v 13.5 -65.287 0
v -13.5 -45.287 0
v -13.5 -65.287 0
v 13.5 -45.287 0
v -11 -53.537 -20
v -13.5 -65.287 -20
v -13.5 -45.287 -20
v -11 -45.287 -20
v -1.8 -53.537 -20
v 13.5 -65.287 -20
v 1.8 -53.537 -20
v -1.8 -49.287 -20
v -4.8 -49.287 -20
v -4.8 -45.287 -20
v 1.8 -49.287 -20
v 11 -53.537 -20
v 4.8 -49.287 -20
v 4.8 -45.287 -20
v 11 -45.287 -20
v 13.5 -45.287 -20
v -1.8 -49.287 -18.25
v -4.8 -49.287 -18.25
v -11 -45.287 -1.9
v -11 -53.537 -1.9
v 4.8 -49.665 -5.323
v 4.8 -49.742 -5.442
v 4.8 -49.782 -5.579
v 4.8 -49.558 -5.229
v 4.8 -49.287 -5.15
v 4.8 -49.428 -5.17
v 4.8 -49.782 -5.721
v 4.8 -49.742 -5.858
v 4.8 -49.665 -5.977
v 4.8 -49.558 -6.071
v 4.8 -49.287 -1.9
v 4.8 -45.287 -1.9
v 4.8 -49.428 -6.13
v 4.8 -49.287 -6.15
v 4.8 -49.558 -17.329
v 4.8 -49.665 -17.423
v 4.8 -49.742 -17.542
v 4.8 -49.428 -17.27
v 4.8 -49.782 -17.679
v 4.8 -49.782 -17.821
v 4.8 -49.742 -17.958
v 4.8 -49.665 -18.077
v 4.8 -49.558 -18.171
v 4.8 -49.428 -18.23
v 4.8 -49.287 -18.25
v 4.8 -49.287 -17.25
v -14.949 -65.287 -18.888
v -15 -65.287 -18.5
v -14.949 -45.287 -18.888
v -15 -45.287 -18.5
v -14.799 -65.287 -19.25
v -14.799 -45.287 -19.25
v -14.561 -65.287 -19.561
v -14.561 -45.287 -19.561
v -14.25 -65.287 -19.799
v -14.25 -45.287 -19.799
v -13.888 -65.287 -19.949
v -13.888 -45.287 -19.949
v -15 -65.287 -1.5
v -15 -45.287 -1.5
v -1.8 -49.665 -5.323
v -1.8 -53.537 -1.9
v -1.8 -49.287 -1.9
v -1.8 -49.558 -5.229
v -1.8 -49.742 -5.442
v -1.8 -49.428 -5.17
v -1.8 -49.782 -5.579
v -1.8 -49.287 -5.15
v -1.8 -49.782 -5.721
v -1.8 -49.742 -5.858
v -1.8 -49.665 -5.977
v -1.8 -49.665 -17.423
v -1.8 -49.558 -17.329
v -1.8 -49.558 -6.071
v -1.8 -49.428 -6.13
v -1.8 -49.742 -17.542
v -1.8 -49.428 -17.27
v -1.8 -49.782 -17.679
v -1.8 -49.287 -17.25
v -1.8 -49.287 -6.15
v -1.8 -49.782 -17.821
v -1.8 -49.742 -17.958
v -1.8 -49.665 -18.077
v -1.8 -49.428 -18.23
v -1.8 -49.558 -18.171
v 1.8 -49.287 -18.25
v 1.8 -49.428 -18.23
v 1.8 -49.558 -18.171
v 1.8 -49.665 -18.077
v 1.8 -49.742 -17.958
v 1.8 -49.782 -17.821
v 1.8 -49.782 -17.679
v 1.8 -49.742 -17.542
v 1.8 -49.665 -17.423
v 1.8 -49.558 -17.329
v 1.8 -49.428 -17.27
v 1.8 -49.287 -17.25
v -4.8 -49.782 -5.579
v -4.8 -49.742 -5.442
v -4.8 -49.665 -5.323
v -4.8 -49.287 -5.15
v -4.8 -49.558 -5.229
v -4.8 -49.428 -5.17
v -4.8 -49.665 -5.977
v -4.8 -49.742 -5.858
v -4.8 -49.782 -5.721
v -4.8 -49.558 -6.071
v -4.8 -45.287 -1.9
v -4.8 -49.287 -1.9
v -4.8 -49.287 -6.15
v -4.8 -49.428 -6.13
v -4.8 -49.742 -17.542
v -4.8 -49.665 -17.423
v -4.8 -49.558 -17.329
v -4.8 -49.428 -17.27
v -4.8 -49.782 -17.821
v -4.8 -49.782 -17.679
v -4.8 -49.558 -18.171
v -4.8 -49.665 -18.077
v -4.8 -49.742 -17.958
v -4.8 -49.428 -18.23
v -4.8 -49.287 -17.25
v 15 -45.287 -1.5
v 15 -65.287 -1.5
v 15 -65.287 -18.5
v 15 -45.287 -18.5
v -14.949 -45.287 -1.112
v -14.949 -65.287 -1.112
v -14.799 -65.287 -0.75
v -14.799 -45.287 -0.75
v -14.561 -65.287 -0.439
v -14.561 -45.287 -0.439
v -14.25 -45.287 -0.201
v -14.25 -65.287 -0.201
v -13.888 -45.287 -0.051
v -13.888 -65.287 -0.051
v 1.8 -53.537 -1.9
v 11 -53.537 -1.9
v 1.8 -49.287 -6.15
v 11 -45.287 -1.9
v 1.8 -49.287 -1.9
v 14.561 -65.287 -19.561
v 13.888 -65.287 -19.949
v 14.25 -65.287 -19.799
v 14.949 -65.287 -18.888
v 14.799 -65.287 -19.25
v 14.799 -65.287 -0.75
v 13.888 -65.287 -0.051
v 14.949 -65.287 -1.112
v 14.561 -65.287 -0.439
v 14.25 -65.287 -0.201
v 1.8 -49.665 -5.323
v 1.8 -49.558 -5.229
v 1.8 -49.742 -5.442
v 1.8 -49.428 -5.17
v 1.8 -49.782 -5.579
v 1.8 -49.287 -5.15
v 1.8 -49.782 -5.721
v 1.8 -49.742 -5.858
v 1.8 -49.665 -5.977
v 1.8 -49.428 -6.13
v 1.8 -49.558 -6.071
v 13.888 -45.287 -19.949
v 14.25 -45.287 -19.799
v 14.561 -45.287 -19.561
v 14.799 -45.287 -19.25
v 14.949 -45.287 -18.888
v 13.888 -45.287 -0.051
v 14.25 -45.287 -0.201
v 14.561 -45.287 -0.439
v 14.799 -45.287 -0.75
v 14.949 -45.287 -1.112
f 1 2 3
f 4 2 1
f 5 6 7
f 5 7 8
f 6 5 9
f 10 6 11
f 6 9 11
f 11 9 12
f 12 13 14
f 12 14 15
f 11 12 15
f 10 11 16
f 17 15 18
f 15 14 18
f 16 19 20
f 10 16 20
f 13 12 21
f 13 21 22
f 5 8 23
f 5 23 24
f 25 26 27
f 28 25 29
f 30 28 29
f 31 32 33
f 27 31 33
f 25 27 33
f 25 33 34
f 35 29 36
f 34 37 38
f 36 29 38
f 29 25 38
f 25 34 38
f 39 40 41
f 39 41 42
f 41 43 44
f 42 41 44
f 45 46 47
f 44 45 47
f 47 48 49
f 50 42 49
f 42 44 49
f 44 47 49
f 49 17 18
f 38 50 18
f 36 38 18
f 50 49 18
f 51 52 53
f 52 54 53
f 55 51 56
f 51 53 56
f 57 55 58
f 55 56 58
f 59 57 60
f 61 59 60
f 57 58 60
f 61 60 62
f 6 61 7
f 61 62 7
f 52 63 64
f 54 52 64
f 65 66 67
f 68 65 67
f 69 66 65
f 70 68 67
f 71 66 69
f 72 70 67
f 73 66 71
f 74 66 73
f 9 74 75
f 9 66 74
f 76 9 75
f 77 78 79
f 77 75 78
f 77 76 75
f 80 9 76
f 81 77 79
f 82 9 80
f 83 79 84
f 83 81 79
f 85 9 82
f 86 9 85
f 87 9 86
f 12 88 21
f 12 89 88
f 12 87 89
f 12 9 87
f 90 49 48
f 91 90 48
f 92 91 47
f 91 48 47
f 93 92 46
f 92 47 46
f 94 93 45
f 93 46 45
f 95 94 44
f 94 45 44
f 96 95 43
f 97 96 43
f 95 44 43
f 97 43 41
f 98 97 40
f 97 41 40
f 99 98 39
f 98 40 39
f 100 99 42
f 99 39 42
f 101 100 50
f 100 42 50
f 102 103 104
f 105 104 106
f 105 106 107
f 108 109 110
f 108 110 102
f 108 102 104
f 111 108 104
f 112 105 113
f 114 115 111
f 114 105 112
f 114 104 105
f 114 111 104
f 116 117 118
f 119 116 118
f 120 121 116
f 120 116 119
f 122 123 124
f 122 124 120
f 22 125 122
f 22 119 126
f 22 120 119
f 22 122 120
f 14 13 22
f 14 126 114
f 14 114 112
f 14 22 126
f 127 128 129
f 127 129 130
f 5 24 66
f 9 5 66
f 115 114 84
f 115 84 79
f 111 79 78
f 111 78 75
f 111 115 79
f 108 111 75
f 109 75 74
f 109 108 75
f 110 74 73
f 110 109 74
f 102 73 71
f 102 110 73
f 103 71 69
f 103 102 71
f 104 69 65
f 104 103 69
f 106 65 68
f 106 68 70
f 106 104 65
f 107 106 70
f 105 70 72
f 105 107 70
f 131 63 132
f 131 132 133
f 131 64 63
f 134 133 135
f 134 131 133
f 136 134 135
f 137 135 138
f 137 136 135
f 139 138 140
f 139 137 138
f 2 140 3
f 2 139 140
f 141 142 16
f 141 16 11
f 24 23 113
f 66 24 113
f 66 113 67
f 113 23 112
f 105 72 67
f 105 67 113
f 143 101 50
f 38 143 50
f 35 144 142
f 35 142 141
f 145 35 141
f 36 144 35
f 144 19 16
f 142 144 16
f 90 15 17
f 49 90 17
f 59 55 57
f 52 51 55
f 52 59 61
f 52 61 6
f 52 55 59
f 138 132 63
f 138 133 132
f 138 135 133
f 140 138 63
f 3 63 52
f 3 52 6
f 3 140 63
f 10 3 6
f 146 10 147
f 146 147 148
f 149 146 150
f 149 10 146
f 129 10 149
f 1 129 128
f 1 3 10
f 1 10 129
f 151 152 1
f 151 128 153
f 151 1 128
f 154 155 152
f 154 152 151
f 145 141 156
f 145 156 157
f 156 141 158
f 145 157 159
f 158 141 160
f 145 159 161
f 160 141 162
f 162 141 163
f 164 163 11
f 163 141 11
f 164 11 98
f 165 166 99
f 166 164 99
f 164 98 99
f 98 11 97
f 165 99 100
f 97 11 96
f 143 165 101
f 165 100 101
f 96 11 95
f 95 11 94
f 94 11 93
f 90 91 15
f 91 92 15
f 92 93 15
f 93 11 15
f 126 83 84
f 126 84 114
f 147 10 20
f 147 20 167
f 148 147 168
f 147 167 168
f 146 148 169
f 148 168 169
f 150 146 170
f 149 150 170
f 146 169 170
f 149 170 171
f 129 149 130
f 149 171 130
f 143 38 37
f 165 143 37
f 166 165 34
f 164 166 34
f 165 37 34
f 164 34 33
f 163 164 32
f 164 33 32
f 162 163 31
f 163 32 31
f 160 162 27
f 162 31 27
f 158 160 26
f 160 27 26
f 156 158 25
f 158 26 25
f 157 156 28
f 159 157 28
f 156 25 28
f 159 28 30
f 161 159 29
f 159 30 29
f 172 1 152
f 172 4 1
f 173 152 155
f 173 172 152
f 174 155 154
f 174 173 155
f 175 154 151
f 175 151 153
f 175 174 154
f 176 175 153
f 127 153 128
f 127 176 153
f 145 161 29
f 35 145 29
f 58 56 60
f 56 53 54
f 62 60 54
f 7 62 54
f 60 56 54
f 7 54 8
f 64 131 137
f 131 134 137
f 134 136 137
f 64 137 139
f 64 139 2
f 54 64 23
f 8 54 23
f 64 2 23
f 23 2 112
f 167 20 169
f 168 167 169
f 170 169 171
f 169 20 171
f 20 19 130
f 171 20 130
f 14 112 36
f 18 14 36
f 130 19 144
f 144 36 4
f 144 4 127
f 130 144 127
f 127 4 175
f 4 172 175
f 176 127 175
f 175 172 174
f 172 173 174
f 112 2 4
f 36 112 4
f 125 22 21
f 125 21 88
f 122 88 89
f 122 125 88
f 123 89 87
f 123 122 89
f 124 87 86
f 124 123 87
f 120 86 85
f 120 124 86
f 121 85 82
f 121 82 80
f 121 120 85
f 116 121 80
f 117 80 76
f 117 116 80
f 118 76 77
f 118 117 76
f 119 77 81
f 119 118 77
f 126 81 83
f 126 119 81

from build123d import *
from OCP.BRepFilletAPI import BRepFilletAPI_MakeChamfer

# Parameters (mm, degrees)
BOSS_EXTRUDE1_DEPTH           = 10
BOSS_EXTRUDE1_DEPTH_BACK      = 20
SKETCH12_R                    = 15
CUT_EXTRUDE9_DEPTH            = 8
CHAMFER1_SIZE                 = 1.5
CHAMFER1_SIZE2                = 0.46241
FILLET11_R                    = 0.78
CHAMFER2_SIZE2                = 5
CHAMFER2_SIZE                 = 8
CUT_EXTRUDE10_START           = -3
SKETCH18_W                    = 25.5
SKETCH18_H                    = 24.1
CUT_EXTRUDE10_DEPTH           = 4.1
SKETCH19_W                    = 8.6
SKETCH19_H                    = 8.6
CUT_EXTRUDE13_DEPTH           = 3.7
CUT_EXTRUDE14_DEPTH           = 2
SKETCH21_R                    = 3.8
CUT_EXTRUDE15_DEPTH           = 116.348128402
SKETCH10_R                    = 12.5
CUT_EXTRUDE8_DEPTH            = 3
SKETCH22_R                    = 0.95
BOSS_EXTRUDE5_DEPTH           = 1.1
BOSS_EXTRUDE5_DRAFT           = 30
BOSS_EXTRUDE5_PROFILE_2_DEPTH = 1.1
BOSS_EXTRUDE5_PROFILE_2_DRAFT = 30
BOSS_EXTRUDE5_PROFILE_3_DEPTH = 1.1
BOSS_EXTRUDE5_PROFILE_3_DRAFT = 30
BOSS_EXTRUDE5_PROFILE_4_DEPTH = 1.1
BOSS_EXTRUDE5_PROFILE_4_DRAFT = 30
CUT_EXTRUDE16_DEPTH           = 8.5
FILLET13_R                    = 2
BOSS_EXTRUDE6_DEPTH           = 3
LPATTERN1_COUNT               = 2
LPATTERN1_PITCH               = 150
LPATTERN1_COPY_1_SKETCH_R     = 0.95
LPATTERN1_COPY_1_DEPTH        = 1.1
LPATTERN1_COPY_1_DRAFT        = 30
LPATTERN1_COPY_2_SKETCH_R     = 0.95
LPATTERN1_COPY_2_DEPTH        = 1.1
LPATTERN1_COPY_2_DRAFT        = 30
LPATTERN1_COPY_3_SKETCH_R     = 0.95
LPATTERN1_COPY_3_DEPTH        = 1.1
LPATTERN1_COPY_3_DRAFT        = 30
LPATTERN1_COPY_4_SKETCH_R     = 0.95
LPATTERN1_COPY_4_DEPTH        = 1.1
LPATTERN1_COPY_4_DRAFT        = 30
LPATTERN1_COPY_5_SKETCH_R     = 0.95
LPATTERN1_COPY_5_DEPTH        = 1.1
LPATTERN1_COPY_5_DRAFT        = 30
LPATTERN1_COPY_6_SKETCH_R     = 0.95
LPATTERN1_COPY_6_DEPTH        = 1.1
LPATTERN1_COPY_6_DRAFT        = 30
LPATTERN1_COPY_7_SKETCH_R     = 0.95
LPATTERN1_COPY_7_DEPTH        = 1.1
LPATTERN1_COPY_7_DRAFT        = 30
FILLET13_OF_LPATTERN1_R       = 2
FILLET12_R                    = 100
FILLET14_R                    = 1
SKETCH32_R                    = 4.55
SKETCH32_R_2                  = 4.5
CUT_EXTRUDE17_DEPTH           = 3
SKETCH33_R                    = 2.75
CUT_EXTRUDE18_DEPTH           = 114.802213105
CUT_EXTRUDE19_DEPTH           = 5
SKETCH56_W                    = 30
SKETCH56_H                    = 20
BOSS_EXTRUDE10_DEPTH          = 20
CUT_EXTRUDE21_DEPTH           = 18.1
FILLET15_R                    = 1.5


# Read off the part's stored shape, not the designer's step: Split3
# Some blends are built 0.0001 mm under size
with BuildPart() as part:
    # Sketch1 → Boss-Extrude1 (new, two sides: drawn at the far end of the back side and taken through both)
    with BuildSketch(Plane.XY.offset(-BOSS_EXTRUDE1_DEPTH_BACK)):
        with BuildLine():
            Line((-100, -15), (0, -51.866662613))
            Line((0, -51.866662613), (100, -15))
            Line((100, -15), (100, 15))
            Line((100, 15), (60, 15))
            add(Edge.make_bspline(
                [(-60, 15), (-39.699350007, 14.814430853), (0, 45.185569147), (39.699350007, 14.814430853), (60, 15)],
                knots=[0, 0, 0, 0, 0.5, 1, 1, 1, 1], degree=3))
            Line((-60, 15), (-100, 15))
            Line((-100, 15), (-100, -15))
        make_face()
        with BuildLine():
            Line((3.188323159, 2.335673435), (2.875864874, 2.765735369))
            Line((2.875864874, 2.765735369), (4.089390366, 3.647413248))
            Line((4.089390366, 3.647413248), (4.40184865, 3.217351313))
            ThreePointArc((4.40184865, 3.217351313), (5.258610463, 4.17939586), (5.908815238, 5.29151288))
            Line((5.908815238, 5.29151288), (5.403247113, 5.455781921))
            Line((5.403247113, 5.455781921), (5.866772605, 6.882366696))
            Line((5.866772605, 6.882366696), (6.37234073, 6.718097654))
            ThreePointArc((6.37234073, 6.718097654), (6.5, 8), (6.37234073, 9.281902346))
            Line((6.37234073, 9.281902346), (5.866772605, 9.117633304))
            Line((5.866772605, 9.117633304), (5.403247113, 10.544218079))
            Line((5.403247113, 10.544218079), (5.908815238, 10.70848712))
            ThreePointArc((5.908815238, 10.70848712), (5.258610463, 11.82060414), (4.40184865, 12.782648687))
            Line((4.40184865, 12.782648687), (4.089390366, 12.352586752))
            Line((4.089390366, 12.352586752), (2.875864874, 13.234264631))
            Line((2.875864874, 13.234264631), (3.188323159, 13.664326565))
            ThreePointArc((3.188323159, 13.664326565), (2.008610463, 14.181867356), (0.75, 14.456585785))
            Line((0.75, 14.456585785), (0.75, 13.925))
            Line((0.75, 13.925), (-0.75, 13.925))
            Line((-0.75, 13.925), (-0.75, 14.456585785))
            ThreePointArc((-0.75, 14.456585785), (-2.008610463, 14.181867356), (-3.188323159, 13.664326565))
            Line((-3.188323159, 13.664326565), (-2.875864874, 13.234264631))
            Line((-2.875864874, 13.234264631), (-4.089390366, 12.352586752))
            Line((-4.089390366, 12.352586752), (-4.40184865, 12.782648687))
            ThreePointArc((-4.40184865, 12.782648687), (-5.258610463, 11.82060414), (-5.908815238, 10.70848712))
            Line((-5.908815238, 10.70848712), (-5.403247113, 10.544218079))
            Line((-5.403247113, 10.544218079), (-5.866772605, 9.117633304))
            Line((-5.866772605, 9.117633304), (-6.37234073, 9.281902346))
            ThreePointArc((-6.37234073, 9.281902346), (-6.5, 8), (-6.37234073, 6.718097654))
            Line((-6.37234073, 6.718097654), (-5.866772605, 6.882366696))
            Line((-5.866772605, 6.882366696), (-5.403247113, 5.455781921))
            Line((-5.403247113, 5.455781921), (-5.908815238, 5.29151288))
            ThreePointArc((-5.908815238, 5.29151288), (-5.258610463, 4.17939586), (-4.40184865, 3.217351313))
            Line((-4.40184865, 3.217351313), (-4.089390366, 3.647413248))
            Line((-4.089390366, 3.647413248), (-2.875864874, 2.765735369))
            Line((-2.875864874, 2.765735369), (-3.188323159, 2.335673435))
            ThreePointArc((-3.188323159, 2.335673435), (-2.008610463, 1.818132644), (-0.75, 1.543414215))
            Line((-0.75, 1.543414215), (-0.75, 2.075))
            Line((-0.75, 2.075), (0.75, 2.075))
            Line((0.75, 2.075), (0.75, 1.543414215))
            ThreePointArc((0.75, 1.543414215), (2.008610463, 1.818132644), (3.188323159, 2.335673435))
        make_face(mode=Mode.SUBTRACT)
    extrude(amount=BOSS_EXTRUDE1_DEPTH + BOSS_EXTRUDE1_DEPTH_BACK)

    # Sketch12 → Cut-Extrude9 (cut)
    with BuildSketch(Plane(origin=(0, 0, -20), x_dir=(-1, 0, 0), z_dir=(0, 0, -1))):
        with Locations((0, 8)):
            Circle(SKETCH12_R)
    extrude(amount=-CUT_EXTRUDE9_DEPTH, mode=Mode.SUBTRACT)

    # Chamfer1: one chamfer whose edges measure the first distance from different faces: ONE call of the kernel's chamfer builder (chamfer() names one face for all edges)
    chamfer1_edges_1 = [part.edges().sort_by_distance(p)[0] for p in [
        (0, 2.075, -12),
    ]]
    chamfer1_side_1 = [part.faces().sort_by_distance(p)[0] for p in [
        (0, 2.075, -1),
    ]]
    chamfer1_edges_2 = [part.edges().sort_by_distance(p)[0] for p in [
        (3.48262762, 3.206574308, -12),
    ]]
    chamfer1_side_2 = [part.faces().sort_by_distance(p)[0] for p in [
        (3.48262762, 3.206574308, -1),
    ]]
    chamfer1_edges_3 = [part.edges().sort_by_distance(p)[0] for p in [
        (5.635009859, 6.169074308, -12),
    ]]
    chamfer1_side_3 = [part.faces().sort_by_distance(p)[0] for p in [
        (5.635009859, 6.169074308, -1),
    ]]
    chamfer1_edges_4 = [part.edges().sort_by_distance(p)[0] for p in [
        (5.635009859, 9.830925692, -12),
    ]]
    chamfer1_side_4 = [part.faces().sort_by_distance(p)[0] for p in [
        (5.635009859, 9.830925692, -1),
    ]]
    chamfer1_edges_5 = [part.edges().sort_by_distance(p)[0] for p in [
        (3.48262762, 12.793425692, -12),
    ]]
    chamfer1_side_5 = [part.faces().sort_by_distance(p)[0] for p in [
        (3.48262762, 12.793425692, -1),
    ]]
    chamfer1_edges_6 = [part.edges().sort_by_distance(p)[0] for p in [
        (0, 13.925, -12),
    ]]
    chamfer1_side_6 = [part.faces().sort_by_distance(p)[0] for p in [
        (0, 13.925, -1),
    ]]
    chamfer1_edges_7 = [part.edges().sort_by_distance(p)[0] for p in [
        (-3.48262762, 12.793425692, -12),
    ]]
    chamfer1_side_7 = [part.faces().sort_by_distance(p)[0] for p in [
        (-3.48262762, 12.793425692, -1),
    ]]
    chamfer1_edges_8 = [part.edges().sort_by_distance(p)[0] for p in [
        (-5.635009859, 9.830925692, -12),
    ]]
    chamfer1_side_8 = [part.faces().sort_by_distance(p)[0] for p in [
        (-5.635009859, 9.830925692, -1),
    ]]
    chamfer1_edges_9 = [part.edges().sort_by_distance(p)[0] for p in [
        (-5.635009859, 6.169074308, -12),
    ]]
    chamfer1_side_9 = [part.faces().sort_by_distance(p)[0] for p in [
        (-5.635009859, 6.169074308, -1),
    ]]
    chamfer1_edges_10 = [part.edges().sort_by_distance(p)[0] for p in [
        (-3.48262762, 3.206574308, -12),
    ]]
    chamfer1_side_10 = [part.faces().sort_by_distance(p)[0] for p in [
        (-3.48262762, 3.206574308, -1),
    ]]
    chamfer1 = BRepFilletAPI_MakeChamfer(part.part.solid().wrapped)
    for e in chamfer1_edges_1:
        chamfer1.Add(CHAMFER1_SIZE, CHAMFER1_SIZE2, e.wrapped, chamfer1_side_1[0].wrapped)  # the first distance lies on this face
    for e in chamfer1_edges_2:
        chamfer1.Add(CHAMFER1_SIZE, CHAMFER1_SIZE2, e.wrapped, chamfer1_side_2[0].wrapped)  # the first distance lies on this face
    for e in chamfer1_edges_3:
        chamfer1.Add(CHAMFER1_SIZE, CHAMFER1_SIZE2, e.wrapped, chamfer1_side_3[0].wrapped)  # the first distance lies on this face
    for e in chamfer1_edges_4:
        chamfer1.Add(CHAMFER1_SIZE, CHAMFER1_SIZE2, e.wrapped, chamfer1_side_4[0].wrapped)  # the first distance lies on this face
    for e in chamfer1_edges_5:
        chamfer1.Add(CHAMFER1_SIZE, CHAMFER1_SIZE2, e.wrapped, chamfer1_side_5[0].wrapped)  # the first distance lies on this face
    for e in chamfer1_edges_6:
        chamfer1.Add(CHAMFER1_SIZE, CHAMFER1_SIZE2, e.wrapped, chamfer1_side_6[0].wrapped)  # the first distance lies on this face
    for e in chamfer1_edges_7:
        chamfer1.Add(CHAMFER1_SIZE, CHAMFER1_SIZE2, e.wrapped, chamfer1_side_7[0].wrapped)  # the first distance lies on this face
    for e in chamfer1_edges_8:
        chamfer1.Add(CHAMFER1_SIZE, CHAMFER1_SIZE2, e.wrapped, chamfer1_side_8[0].wrapped)  # the first distance lies on this face
    for e in chamfer1_edges_9:
        chamfer1.Add(CHAMFER1_SIZE, CHAMFER1_SIZE2, e.wrapped, chamfer1_side_9[0].wrapped)  # the first distance lies on this face
    for e in chamfer1_edges_10:
        chamfer1.Add(CHAMFER1_SIZE, CHAMFER1_SIZE2, e.wrapped, chamfer1_side_10[0].wrapped)  # the first distance lies on this face
    add(Compound.cast(chamfer1.Shape()), mode=Mode.REPLACE)

    # Fillet11
    # the kernel refuses this fillet: 0.78 mm, written as the material it takes off along each edge
    with BuildSketch(Plane(origin=(-4.089390366, 12.352586752, -12.348462837), x_dir=(-0.5877852522924715, 0.8090169943749486, 0), z_dir=(0, 0, 1)), Plane(origin=(-5.866772605, 9.117633304, -12.348462837), x_dir=(-0.9510565162951549, 0.3090169943749433, 0), z_dir=(0, 0, 1)), Plane(origin=(-0.75, 13.925, -12.348462837), x_dir=(0, 1, 0), z_dir=(0, 0, 1)), Plane(origin=(2.875864874, 13.234264631, -12.348462837), x_dir=(0.5877852522924727, 0.8090169943749479, 0), z_dir=(0, 0, 1)), Plane(origin=(5.403247113, 10.544218079, -12.348462837), x_dir=(0.9510565162951538, 0.30901699437494734, 0), z_dir=(0, 0, 1)), Plane(origin=(5.866772605, 6.882366696, -12.348462837), x_dir=(0.9510565162951544, -0.30901699437494534, 0), z_dir=(0, 0, 1)), Plane(origin=(-5.403247113, 5.455781921, -12.348462837), x_dir=(-0.9510565162951544, -0.30901699437494484, 0), z_dir=(0, 0, 1)), Plane(origin=(-2.875864874, 2.765735369, -12.348462837), x_dir=(-0.5877852522924728, -0.8090169943749477, 0), z_dir=(0, 0, 1)), Plane(origin=(0.75, 2.075, -12.348462837), x_dir=(0, -1, 0), z_dir=(0, 0, 1)), Plane(origin=(4.089390366, 3.647413248, -12.348462837), x_dir=(0.5877852522924725, -0.8090169943749479, 0), z_dir=(0, 0, 1))) as fillet11_piece_1:
        with BuildLine():
            CenterArc((0.78, -0.739385135), FILLET11_R, 108.571012268, 71.428987732)
            Line((0, -0.739385135), (-0.0156, -0.739385135))
            Line((-0.0156, -0.739385135), (-0.0156, 0))
            Line((-0.0156, 0), (0, 0.0156))
            ThreePointArc((0, 0.0156), (0.265792893, 0.0156), (0.526617501, 0.014787703))
            Line((0.526617501, 0.014787703), (0.531585785, 0))
        make_face()
    extrude(amount=24.196925675, mode=Mode.SUBTRACT)
    with BuildSketch(Plane(origin=(-5.403247113, 10.544218079, -12.348462837), x_dir=(-0.3090169943749473, -0.9510565162951535, 0), z_dir=(0, 0, 1)), Plane(origin=(-2.875864874, 13.234264631, -12.348462837), x_dir=(-0.809016994374947, -0.5877852522924738, 0), z_dir=(0, 0, 1)), Plane(origin=(0.75, 13.925, -12.348462837), x_dir=(-1, 0, 0), z_dir=(0, 0, 1)), Plane(origin=(4.089390366, 12.352586752, -12.348462837), x_dir=(-0.8090169943749471, 0.5877852522924735, 0), z_dir=(0, 0, 1)), Plane(origin=(5.866772605, 9.117633304, -12.348462837), x_dir=(-0.30901699437494623, 0.951056516295154, 0), z_dir=(0, 0, 1)), Plane(origin=(5.403247113, 5.455781921, -12.348462837), x_dir=(0.30901699437494773, 0.9510565162951536, 0), z_dir=(0, 0, 1)), Plane(origin=(-5.866772605, 6.882366696, -12.348462837), x_dir=(0.3090169943749473, -0.9510565162951536, 0), z_dir=(0, 0, 1)), Plane(origin=(-4.089390366, 3.647413248, -12.348462837), x_dir=(0.809016994374947, -0.5877852522924737, 0), z_dir=(0, 0, 1)), Plane(origin=(-0.75, 2.075, -12.348462837), x_dir=(1, 0, 0), z_dir=(0, 0, 1)), Plane(origin=(2.875864874, 2.765735369, -12.348462837), x_dir=(0.8090169943749471, 0.5877852522924735, 0), z_dir=(0, 0, 1))) as fillet11_piece_2:
        with BuildLine():
            CenterArc((0.739385135, -0.78), FILLET11_R, 90, 71.428987732)
            Line((0, -0.531585785), (-0.014787703, -0.526617501))
            ThreePointArc((-0.014787703, -0.526617501), (-0.0156, -0.265792893), (-0.0156, 0))
            Line((-0.0156, 0), (0, 0.0156))
            Line((0, 0.0156), (0.739385135, 0.0156))
            Line((0.739385135, 0.0156), (0.739385135, 0))
        make_face()
    extrude(amount=24.196925675, mode=Mode.SUBTRACT)

    # Chamfer2
    chamfer2_edges = [part.edges().sort_by_distance(p)[0] for p in [
        (15, 8, -20),
    ]]
    chamfer2_side = [part.faces().sort_by_distance(p)[0] for p in [
        (15, 8, -19.9),
    ]]
    chamfer(chamfer2_edges, length=CHAMFER2_SIZE - 0.0001, length2=CHAMFER2_SIZE2 - 0.0001, reference=chamfer2_side[0])  # a hair under: the kernel refuses the full size

    # Sketch18 → Cut-Extrude10 (cut)
    with BuildSketch(Plane.XY.offset(CUT_EXTRUDE10_START)):
        with Locations((-75, 0.285)):
            Rectangle(SKETCH18_W, SKETCH18_H)
    cut_extrude10 = extrude(amount=CUT_EXTRUDE10_DEPTH, mode=Mode.SUBTRACT)

    # Sketch19 → Cut-Extrude13 (cut)
    with BuildSketch(Plane(origin=(0, 0, 1.1), x_dir=(-1, 0, 0), z_dir=(0, 0, -1))):
        with Locations((75, -2.265)):
            Rectangle(SKETCH19_W, SKETCH19_H)
    cut_extrude13 = extrude(amount=-CUT_EXTRUDE13_DEPTH, mode=Mode.SUBTRACT)

    # Sketch20 → Cut-Extrude14 (cut)
    with BuildSketch(Plane(origin=(0, 0, 1.1), x_dir=(-1, 0, 0), z_dir=(0, 0, -1))):
        Polygon((79.3, 2.035), (79.3, 5.335), (81.5, 5.335), (81.5, 9.835), (70.7, 9.835), (70.7, 2.035), align=None)
    cut_extrude14 = extrude(amount=-CUT_EXTRUDE14_DEPTH, mode=Mode.SUBTRACT)

    # Sketch21 → Cut-Extrude15 (cut, through all)
    with BuildSketch(Plane(origin=(0, 0, 4.8), x_dir=(-1, 0, 0), z_dir=(0, 0, -1))):
        with Locations((75, -2.265)):
            Circle(SKETCH21_R)
    cut_extrude15 = extrude(amount=-CUT_EXTRUDE15_DEPTH, mode=Mode.SUBTRACT)

    # Sketch10 → Cut-Extrude8 (cut)
    with BuildSketch(Plane.XY.offset(10)):
        with Locations((-75, -2.265)):
            Circle(SKETCH10_R)
    cut_extrude8 = extrude(amount=-CUT_EXTRUDE8_DEPTH, mode=Mode.SUBTRACT)


with BuildPart() as boss_extrude5_tool:
    # Sketch22 → Boss-Extrude5 (with draft: the straight prism first)
    with BuildSketch(Plane(origin=(0, 0, 1.1), x_dir=(-1, 0, 0), z_dir=(0, 0, -1))):
        with Locations((64.35, 10.235)):
            Circle(SKETCH22_R)
    extrude(amount=BOSS_EXTRUDE5_DEPTH)
    # Boss-Extrude5: the draft: its side faces are tilted about the plane it starts from
    boss_extrude5_sides = [boss_extrude5_tool.faces().sort_by_distance(p)[0] for p in [
        (-63.4, 10.235, 0.55),
    ]]
    draft(boss_extrude5_sides, Plane(origin=(0, 0, 1.1), x_dir=(-1, 0, 0), z_dir=(0, 0, -1)), BOSS_EXTRUDE5_DRAFT)


with BuildPart() as part_1:
    add(part.part)

    # Boss-Extrude5: add boss_extrude5_tool
    add(boss_extrude5_tool.part)


with BuildPart() as boss_extrude5_profile_2_tool:
    # Sketch22 → Boss-Extrude5 profile 2 (with draft: the straight prism first)
    with BuildSketch(Plane(origin=(0, 0, 1.1), x_dir=(-1, 0, 0), z_dir=(0, 0, -1))):
        with Locations((85.65, 10.235)):
            Circle(SKETCH22_R)
    extrude(amount=BOSS_EXTRUDE5_PROFILE_2_DEPTH)
    # Boss-Extrude5 profile 2: the draft: its side faces are tilted about the plane it starts from
    boss_extrude5_profile_2_sides = [boss_extrude5_profile_2_tool.faces().sort_by_distance(p)[0] for p in [
        (-84.7, 10.235, 0.55),
    ]]
    draft(boss_extrude5_profile_2_sides, Plane(origin=(0, 0, 1.1), x_dir=(-1, 0, 0), z_dir=(0, 0, -1)), BOSS_EXTRUDE5_PROFILE_2_DRAFT)


with BuildPart() as part_2:
    add(part_1.part)

    # Boss-Extrude5 profile 2: add boss_extrude5_profile_2_tool
    add(boss_extrude5_profile_2_tool.part)


with BuildPart() as boss_extrude5_profile_3_tool:
    # Sketch22 → Boss-Extrude5 profile 3 (with draft: the straight prism first)
    with BuildSketch(Plane(origin=(0, 0, 1.1), x_dir=(-1, 0, 0), z_dir=(0, 0, -1))):
        with Locations((85.65, -2.105)):
            Circle(SKETCH22_R)
    extrude(amount=BOSS_EXTRUDE5_PROFILE_3_DEPTH)
    # Boss-Extrude5 profile 3: the draft: its side faces are tilted about the plane it starts from
    boss_extrude5_profile_3_sides = [boss_extrude5_profile_3_tool.faces().sort_by_distance(p)[0] for p in [
        (-84.7, -2.105, 0.55),
    ]]
    draft(boss_extrude5_profile_3_sides, Plane(origin=(0, 0, 1.1), x_dir=(-1, 0, 0), z_dir=(0, 0, -1)), BOSS_EXTRUDE5_PROFILE_3_DRAFT)


with BuildPart() as part_3:
    add(part_2.part)

    # Boss-Extrude5 profile 3: add boss_extrude5_profile_3_tool
    add(boss_extrude5_profile_3_tool.part)


with BuildPart() as boss_extrude5_profile_4_tool:
    # Sketch22 → Boss-Extrude5 profile 4 (with draft: the straight prism first)
    with BuildSketch(Plane(origin=(0, 0, 1.1), x_dir=(-1, 0, 0), z_dir=(0, 0, -1))):
        with Locations((64.35, -2.105)):
            Circle(SKETCH22_R)
    extrude(amount=BOSS_EXTRUDE5_PROFILE_4_DEPTH)
    # Boss-Extrude5 profile 4: the draft: its side faces are tilted about the plane it starts from
    boss_extrude5_profile_4_sides = [boss_extrude5_profile_4_tool.faces().sort_by_distance(p)[0] for p in [
        (-63.4, -2.105, 0.55),
    ]]
    draft(boss_extrude5_profile_4_sides, Plane(origin=(0, 0, 1.1), x_dir=(-1, 0, 0), z_dir=(0, 0, -1)), BOSS_EXTRUDE5_PROFILE_4_DRAFT)


with BuildPart() as part_4:
    add(part_3.part)

    # Boss-Extrude5 profile 4: add boss_extrude5_profile_4_tool
    add(boss_extrude5_profile_4_tool.part)

    # Sketch24 → Cut-Extrude16 (cut, symmetric)
    with BuildSketch(Plane(origin=(-75, 0, 0), x_dir=(0, 0, -1), z_dir=(1, 0, 0))):
        Polygon((0.8, -11.765), (0.8, -19.265), (20, -19.265), (20, -18.065), (2, -18.065), (2, -11.765), align=None)
    cut_extrude16 = extrude(amount=CUT_EXTRUDE16_DEPTH, both=True, mode=Mode.SUBTRACT)

    # Fillet13
    fillet13_edges = [part_4.edges().sort_by_distance(p)[0] for p in [
        (-75, -19.265, -0.8),
        (-75, -18.065, -2),
    ]]
    fillet(fillet13_edges, radius=FILLET13_R)

    # Sketch25 → Boss-Extrude6 (add)
    with BuildSketch(Plane.XY.offset(-3)):
        with BuildLine():
            Line((-84.672341587, 10.739166667), (-83.303552478, 10.739166667))
            ThreePointArc((-83.303552478, 10.739166667), (-83.952943725, 8.537943725), (-86.154166667, 7.888552478))
            Line((-86.154166667, 7.888552478), (-86.154166667, 9.257341587))
            ThreePointArc((-86.154166667, 9.257341587), (-84.872182541, 9.457182541), (-84.672341587, 10.739166667))
        make_face()
        with BuildLine():
            Line((-65.327658413, 10.739166667), (-66.696447522, 10.739166667))
            ThreePointArc((-66.696447522, 10.739166667), (-66.047056275, 8.537943725), (-63.845833333, 7.888552478))
            Line((-63.845833333, 7.888552478), (-63.845833333, 9.257341587))
            ThreePointArc((-63.845833333, 9.257341587), (-65.127817459, 9.457182541), (-65.327658413, 10.739166667))
        make_face()
        with BuildLine():
            Line((-85.65, -1.005), (-85.65, 0.295))
            ThreePointArc((-85.65, 0.295), (-83.25, -2.105), (-85.65, -4.505))
            Line((-85.65, -4.505), (-85.65, -3.205))
            ThreePointArc((-85.65, -3.205), (-84.55, -2.105), (-85.65, -1.005))
        make_face()
        with BuildLine():
            Line((-64.35, -3.205), (-64.35, -4.505))
            ThreePointArc((-64.35, -4.505), (-66.75, -2.105), (-64.35, 0.295))
            Line((-64.35, 0.295), (-64.35, -1.005))
            ThreePointArc((-64.35, -1.005), (-65.45, -2.105), (-64.35, -3.205))
        make_face()
    boss_extrude6 = extrude(amount=BOSS_EXTRUDE6_DEPTH)

    # LPattern1: Cut-Extrude10, Cut-Extrude13, Cut-Extrude14, Cut-Extrude15, Cut-Extrude8, Cut-Extrude16, Boss-Extrude6 ×2
    with Locations(*[(i * LPATTERN1_PITCH, 0, 0) for i in range(1, LPATTERN1_COUNT)]):
        add(cut_extrude10, mode=Mode.SUBTRACT)
        add(cut_extrude13, mode=Mode.SUBTRACT)
        add(cut_extrude14, mode=Mode.SUBTRACT)
        add(cut_extrude15, mode=Mode.SUBTRACT)
        add(cut_extrude8, mode=Mode.SUBTRACT)
        add(cut_extrude16, mode=Mode.SUBTRACT)
        add(boss_extrude6)


with BuildPart() as lpattern1_copy_1_tool:
    # LPattern1 copy 1 sketch → LPattern1 copy 1 (with draft: the straight prism first)
    with BuildSketch(Plane(origin=(150, 0, 1.1), x_dir=(-1, 0, 0), z_dir=(0, 0, -1))):
        with Locations((64.35, 10.235)):
            Circle(LPATTERN1_COPY_1_SKETCH_R)
    extrude(amount=LPATTERN1_COPY_1_DEPTH)
    # LPattern1 copy 1: the draft: its side faces are tilted about the plane it starts from
    lpattern1_copy_1_sides = [lpattern1_copy_1_tool.faces().sort_by_distance(p)[0] for p in [
        (86.6, 10.235, 0.55),
    ]]
    draft(lpattern1_copy_1_sides, Plane(origin=(150, 0, 1.1), x_dir=(-1, 0, 0), z_dir=(0, 0, -1)), LPATTERN1_COPY_1_DRAFT)


with BuildPart() as part_5:
    add(part_4.part)

    # LPattern1 copy 1: add lpattern1_copy_1_tool
    add(lpattern1_copy_1_tool.part)


with BuildPart() as lpattern1_copy_2_tool:
    # LPattern1 copy 2 sketch → LPattern1 copy 2 (with draft: the straight prism first)
    with BuildSketch(Plane(origin=(150, 0, 1.1), x_dir=(-1, 0, 0), z_dir=(0, 0, -1))):
        with Locations((85.65, 10.235)):
            Circle(LPATTERN1_COPY_2_SKETCH_R)
    extrude(amount=LPATTERN1_COPY_2_DEPTH)
    # LPattern1 copy 2: the draft: its side faces are tilted about the plane it starts from
    lpattern1_copy_2_sides = [lpattern1_copy_2_tool.faces().sort_by_distance(p)[0] for p in [
        (65.3, 10.235, 0.55),
    ]]
    draft(lpattern1_copy_2_sides, Plane(origin=(150, 0, 1.1), x_dir=(-1, 0, 0), z_dir=(0, 0, -1)), LPATTERN1_COPY_2_DRAFT)


with BuildPart() as part_6:
    add(part_5.part)

    # LPattern1 copy 2: add lpattern1_copy_2_tool
    add(lpattern1_copy_2_tool.part)


with BuildPart() as lpattern1_copy_3_tool:
    # LPattern1 copy 3 sketch → LPattern1 copy 3 (with draft: the straight prism first)
    with BuildSketch(Plane(origin=(150, 0, 1.1), x_dir=(-1, 0, 0), z_dir=(0, 0, -1))):
        with Locations((85.65, -2.105)):
            Circle(LPATTERN1_COPY_3_SKETCH_R)
    extrude(amount=LPATTERN1_COPY_3_DEPTH)
    # LPattern1 copy 3: the draft: its side faces are tilted about the plane it starts from
    lpattern1_copy_3_sides = [lpattern1_copy_3_tool.faces().sort_by_distance(p)[0] for p in [
        (65.3, -2.105, 0.55),
    ]]
    draft(lpattern1_copy_3_sides, Plane(origin=(150, 0, 1.1), x_dir=(-1, 0, 0), z_dir=(0, 0, -1)), LPATTERN1_COPY_3_DRAFT)


with BuildPart() as part_7:
    add(part_6.part)

    # LPattern1 copy 3: add lpattern1_copy_3_tool
    add(lpattern1_copy_3_tool.part)


with BuildPart() as lpattern1_copy_4_tool:
    # LPattern1 copy 4 sketch → LPattern1 copy 4 (with draft: the straight prism first)
    with BuildSketch(Plane(origin=(150, 0, 1.1), x_dir=(-1, 0, 0), z_dir=(0, 0, -1))):
        with Locations((64.35, -2.105)):
            Circle(LPATTERN1_COPY_4_SKETCH_R)
    extrude(amount=LPATTERN1_COPY_4_DEPTH)
    # LPattern1 copy 4: the draft: its side faces are tilted about the plane it starts from
    lpattern1_copy_4_sides = [lpattern1_copy_4_tool.faces().sort_by_distance(p)[0] for p in [
        (86.6, -2.105, 0.55),
    ]]
    draft(lpattern1_copy_4_sides, Plane(origin=(150, 0, 1.1), x_dir=(-1, 0, 0), z_dir=(0, 0, -1)), LPATTERN1_COPY_4_DRAFT)


with BuildPart() as part_8:
    add(part_7.part)

    # LPattern1 copy 4: add lpattern1_copy_4_tool
    add(lpattern1_copy_4_tool.part)


with BuildPart() as lpattern1_copy_5_tool:
    # LPattern1 copy 5 sketch → LPattern1 copy 5 (with draft: the straight prism first)
    with BuildSketch(Plane(origin=(150, 0, 1.1), x_dir=(-1, 0, 0), z_dir=(0, 0, -1))):
        with Locations((85.65, 10.235)):
            Circle(LPATTERN1_COPY_5_SKETCH_R)
    extrude(amount=LPATTERN1_COPY_5_DEPTH)
    # LPattern1 copy 5: the draft: its side faces are tilted about the plane it starts from
    lpattern1_copy_5_sides = [lpattern1_copy_5_tool.faces().sort_by_distance(p)[0] for p in [
        (65.3, 10.235, 0.55),
    ]]
    draft(lpattern1_copy_5_sides, Plane(origin=(150, 0, 1.1), x_dir=(-1, 0, 0), z_dir=(0, 0, -1)), LPATTERN1_COPY_5_DRAFT)


with BuildPart() as part_9:
    add(part_8.part)

    # LPattern1 copy 5: add lpattern1_copy_5_tool
    add(lpattern1_copy_5_tool.part)


with BuildPart() as lpattern1_copy_6_tool:
    # LPattern1 copy 6 sketch → LPattern1 copy 6 (with draft: the straight prism first)
    with BuildSketch(Plane(origin=(150, 0, 1.1), x_dir=(-1, 0, 0), z_dir=(0, 0, -1))):
        with Locations((85.65, -2.105)):
            Circle(LPATTERN1_COPY_6_SKETCH_R)
    extrude(amount=LPATTERN1_COPY_6_DEPTH)
    # LPattern1 copy 6: the draft: its side faces are tilted about the plane it starts from
    lpattern1_copy_6_sides = [lpattern1_copy_6_tool.faces().sort_by_distance(p)[0] for p in [
        (65.3, -2.105, 0.55),
    ]]
    draft(lpattern1_copy_6_sides, Plane(origin=(150, 0, 1.1), x_dir=(-1, 0, 0), z_dir=(0, 0, -1)), LPATTERN1_COPY_6_DRAFT)


with BuildPart() as part_10:
    add(part_9.part)

    # LPattern1 copy 6: add lpattern1_copy_6_tool
    add(lpattern1_copy_6_tool.part)


with BuildPart() as lpattern1_copy_7_tool:
    # LPattern1 copy 7 sketch → LPattern1 copy 7 (with draft: the straight prism first)
    with BuildSketch(Plane(origin=(150, 0, 1.1), x_dir=(-1, 0, 0), z_dir=(0, 0, -1))):
        with Locations((64.35, -2.105)):
            Circle(LPATTERN1_COPY_7_SKETCH_R)
    extrude(amount=LPATTERN1_COPY_7_DEPTH)
    # LPattern1 copy 7: the draft: its side faces are tilted about the plane it starts from
    lpattern1_copy_7_sides = [lpattern1_copy_7_tool.faces().sort_by_distance(p)[0] for p in [
        (86.6, -2.105, 0.55),
    ]]
    draft(lpattern1_copy_7_sides, Plane(origin=(150, 0, 1.1), x_dir=(-1, 0, 0), z_dir=(0, 0, -1)), LPATTERN1_COPY_7_DRAFT)


with BuildPart() as part_11:
    add(part_10.part)

    # LPattern1 copy 7: add lpattern1_copy_7_tool
    add(lpattern1_copy_7_tool.part)

    # Fillet13 of LPattern1
    fillet13_of_lpattern1_edges = [part_11.edges().sort_by_distance(p)[0] for p in [
        (75, -19.265, -0.8),
        (75, -18.065, -2),
    ]]
    fillet(fillet13_of_lpattern1_edges, radius=FILLET13_OF_LPATTERN1_R)

    # Fillet12
    fillet12_edges = [part_11.edges().sort_by_distance(p)[0] for p in [
        (0, -51.866662613, -5),
    ]]
    fillet(fillet12_edges, radius=FILLET12_R)

    # Fillet14
    fillet14_edges = [part_11.edges().sort_by_distance(p)[0] for p in [
        (19.9999, 8, -20),
        (-87.5, -2.265, 10),
        (62.5, -2.265, 10),
    ]]
    fillet(fillet14_edges, radius=FILLET14_R)

    # Sketch32 → Cut-Extrude17 (cut)
    with BuildSketch(Plane.XY.offset(10)):
        with Locations((-93.5, -2.271550921)):
            Circle(SKETCH32_R)
        with Locations((-28.332209431, 14.008347309)):
            Circle(SKETCH32_R_2)
        with Locations((0, -32.79283808)):
            Circle(SKETCH32_R_2)
    cut_extrude17 = extrude(amount=-CUT_EXTRUDE17_DEPTH, mode=Mode.SUBTRACT)

    # Sketch33 → Cut-Extrude18 (cut, through all)
    with BuildSketch(Plane.XY.offset(10)):
        with Locations((-28.332209431, 14.008347309)):
            Circle(SKETCH33_R)
        with Locations((-93.5, -2.271550921)):
            Circle(SKETCH33_R)
        with Locations((0, -32.79283808)):
            Circle(SKETCH33_R)
    cut_extrude18 = extrude(amount=-CUT_EXTRUDE18_DEPTH, mode=Mode.SUBTRACT)

    # Sketch35 → Cut-Extrude19 (cut)
    with BuildSketch(Plane(origin=(0, 0, -20), x_dir=(-1, 0, 0), z_dir=(0, 0, -1))):
        Polygon((4.55, -30.165894355), (0, -27.53895063), (-4.55, -30.165894355), (-4.55, -35.419781805), (0, -38.04672553), (4.55, -35.419781805), align=None)
        Polygon((32.882209431, 16.635291034), (28.332209431, 19.262234759), (23.782209431, 16.635291034), (23.782209431, 11.381403584), (28.332209431, 8.75445986), (32.882209431, 11.381403584), align=None)
        Polygon((98.05, 0.355392804), (93.5, 2.982336529), (88.95, 0.355392804), (88.95, -4.898494646), (93.5, -7.525438371), (98.05, -4.898494646), align=None)
    cut_extrude19 = extrude(amount=-CUT_EXTRUDE19_DEPTH, mode=Mode.SUBTRACT)

    # Mirror1: Cut-Extrude17, Cut-Extrude18, Cut-Extrude19 across plane
    add(cut_extrude17.mirror(Plane(origin=(0, 0, 0), x_dir=(0, 0, 1), z_dir=(1, 0, 0))), mode=Mode.SUBTRACT)
    add(cut_extrude18.mirror(Plane(origin=(0, 0, 0), x_dir=(0, 0, 1), z_dir=(1, 0, 0))), mode=Mode.SUBTRACT)
    add(cut_extrude19.mirror(Plane(origin=(0, 0, 0), x_dir=(0, 0, 1), z_dir=(1, 0, 0))), mode=Mode.SUBTRACT)

    # Split2
    split(bisect_by=Plane.XY, keep=Keep.BOTTOM)


with BuildPart() as body_2:
    # Sketch56 → Boss-Extrude10 (new body)
    with BuildSketch(Plane.XY):
        with Locations((0, -55.287345613)):
            Rectangle(SKETCH56_W, SKETCH56_H)
    extrude(amount=-BOSS_EXTRUDE10_DEPTH)

    # Sketch46 → Cut-Extrude21 (cut)
    with BuildSketch(Plane(origin=(0, 0, -20), x_dir=(-1, 0, 0), z_dir=(0, 0, -1))):
        Polygon((-11, -45.287345613), (-11, -53.537345613), (-1.8, -53.537345613), (-1.8, -49.287345613), (-4.8, -49.287345613), (-4.8, -45.287345613), align=None)
        Polygon((4.8, -49.287345613), (4.8, -45.287345613), (11, -45.287345613), (11, -53.537345613), (1.8, -53.537345613), (1.8, -49.287345613), align=None)
    extrude(amount=-CUT_EXTRUDE21_DEPTH, mode=Mode.SUBTRACT)

    # Sweep10: sweep along a path in Sketch55
    with BuildLine(Plane.XZ.offset(49.287345613)) as sweep10_path:
        Line((-1.8, -17.66984137), (-4.8, -17.66984137))
    # Sketch54 → Sweep10 (sweep)
    with BuildSketch(Plane.ZY.offset(1.8)):
        with BuildLine():
            Line((-5.15, -49.287345613), (-6.15, -49.287345613))
            ThreePointArc((-6.15, -49.287345613), (-5.65, -49.787345613), (-5.15, -49.287345613))
        make_face()
        with BuildLine():
            Line((-18.25, -49.287345613), (-17.25, -49.287345613))
            ThreePointArc((-17.25, -49.287345613), (-17.75, -49.787345613), (-18.25, -49.287345613))
        make_face()
    sweep10 = sweep(path=sweep10_path.line)

    # Mirror2: Sweep10 across plane
    add(sweep10.mirror(Plane(origin=(0, 0, 0), x_dir=(0, 0, 1), z_dir=(1, 0, 0))))

    # Fillet15
    fillet15_edges = [body_2.edges().sort_by_distance(p)[0] for p in [
        (15, -55.287345613, -20),
        (-15, -55.287345613, -20),
        (15, -55.287345613, 0),
        (-15, -55.287345613, 0),
    ]]
    fillet(fillet15_edges, radius=FILLET15_R)


solid = body_2.part
